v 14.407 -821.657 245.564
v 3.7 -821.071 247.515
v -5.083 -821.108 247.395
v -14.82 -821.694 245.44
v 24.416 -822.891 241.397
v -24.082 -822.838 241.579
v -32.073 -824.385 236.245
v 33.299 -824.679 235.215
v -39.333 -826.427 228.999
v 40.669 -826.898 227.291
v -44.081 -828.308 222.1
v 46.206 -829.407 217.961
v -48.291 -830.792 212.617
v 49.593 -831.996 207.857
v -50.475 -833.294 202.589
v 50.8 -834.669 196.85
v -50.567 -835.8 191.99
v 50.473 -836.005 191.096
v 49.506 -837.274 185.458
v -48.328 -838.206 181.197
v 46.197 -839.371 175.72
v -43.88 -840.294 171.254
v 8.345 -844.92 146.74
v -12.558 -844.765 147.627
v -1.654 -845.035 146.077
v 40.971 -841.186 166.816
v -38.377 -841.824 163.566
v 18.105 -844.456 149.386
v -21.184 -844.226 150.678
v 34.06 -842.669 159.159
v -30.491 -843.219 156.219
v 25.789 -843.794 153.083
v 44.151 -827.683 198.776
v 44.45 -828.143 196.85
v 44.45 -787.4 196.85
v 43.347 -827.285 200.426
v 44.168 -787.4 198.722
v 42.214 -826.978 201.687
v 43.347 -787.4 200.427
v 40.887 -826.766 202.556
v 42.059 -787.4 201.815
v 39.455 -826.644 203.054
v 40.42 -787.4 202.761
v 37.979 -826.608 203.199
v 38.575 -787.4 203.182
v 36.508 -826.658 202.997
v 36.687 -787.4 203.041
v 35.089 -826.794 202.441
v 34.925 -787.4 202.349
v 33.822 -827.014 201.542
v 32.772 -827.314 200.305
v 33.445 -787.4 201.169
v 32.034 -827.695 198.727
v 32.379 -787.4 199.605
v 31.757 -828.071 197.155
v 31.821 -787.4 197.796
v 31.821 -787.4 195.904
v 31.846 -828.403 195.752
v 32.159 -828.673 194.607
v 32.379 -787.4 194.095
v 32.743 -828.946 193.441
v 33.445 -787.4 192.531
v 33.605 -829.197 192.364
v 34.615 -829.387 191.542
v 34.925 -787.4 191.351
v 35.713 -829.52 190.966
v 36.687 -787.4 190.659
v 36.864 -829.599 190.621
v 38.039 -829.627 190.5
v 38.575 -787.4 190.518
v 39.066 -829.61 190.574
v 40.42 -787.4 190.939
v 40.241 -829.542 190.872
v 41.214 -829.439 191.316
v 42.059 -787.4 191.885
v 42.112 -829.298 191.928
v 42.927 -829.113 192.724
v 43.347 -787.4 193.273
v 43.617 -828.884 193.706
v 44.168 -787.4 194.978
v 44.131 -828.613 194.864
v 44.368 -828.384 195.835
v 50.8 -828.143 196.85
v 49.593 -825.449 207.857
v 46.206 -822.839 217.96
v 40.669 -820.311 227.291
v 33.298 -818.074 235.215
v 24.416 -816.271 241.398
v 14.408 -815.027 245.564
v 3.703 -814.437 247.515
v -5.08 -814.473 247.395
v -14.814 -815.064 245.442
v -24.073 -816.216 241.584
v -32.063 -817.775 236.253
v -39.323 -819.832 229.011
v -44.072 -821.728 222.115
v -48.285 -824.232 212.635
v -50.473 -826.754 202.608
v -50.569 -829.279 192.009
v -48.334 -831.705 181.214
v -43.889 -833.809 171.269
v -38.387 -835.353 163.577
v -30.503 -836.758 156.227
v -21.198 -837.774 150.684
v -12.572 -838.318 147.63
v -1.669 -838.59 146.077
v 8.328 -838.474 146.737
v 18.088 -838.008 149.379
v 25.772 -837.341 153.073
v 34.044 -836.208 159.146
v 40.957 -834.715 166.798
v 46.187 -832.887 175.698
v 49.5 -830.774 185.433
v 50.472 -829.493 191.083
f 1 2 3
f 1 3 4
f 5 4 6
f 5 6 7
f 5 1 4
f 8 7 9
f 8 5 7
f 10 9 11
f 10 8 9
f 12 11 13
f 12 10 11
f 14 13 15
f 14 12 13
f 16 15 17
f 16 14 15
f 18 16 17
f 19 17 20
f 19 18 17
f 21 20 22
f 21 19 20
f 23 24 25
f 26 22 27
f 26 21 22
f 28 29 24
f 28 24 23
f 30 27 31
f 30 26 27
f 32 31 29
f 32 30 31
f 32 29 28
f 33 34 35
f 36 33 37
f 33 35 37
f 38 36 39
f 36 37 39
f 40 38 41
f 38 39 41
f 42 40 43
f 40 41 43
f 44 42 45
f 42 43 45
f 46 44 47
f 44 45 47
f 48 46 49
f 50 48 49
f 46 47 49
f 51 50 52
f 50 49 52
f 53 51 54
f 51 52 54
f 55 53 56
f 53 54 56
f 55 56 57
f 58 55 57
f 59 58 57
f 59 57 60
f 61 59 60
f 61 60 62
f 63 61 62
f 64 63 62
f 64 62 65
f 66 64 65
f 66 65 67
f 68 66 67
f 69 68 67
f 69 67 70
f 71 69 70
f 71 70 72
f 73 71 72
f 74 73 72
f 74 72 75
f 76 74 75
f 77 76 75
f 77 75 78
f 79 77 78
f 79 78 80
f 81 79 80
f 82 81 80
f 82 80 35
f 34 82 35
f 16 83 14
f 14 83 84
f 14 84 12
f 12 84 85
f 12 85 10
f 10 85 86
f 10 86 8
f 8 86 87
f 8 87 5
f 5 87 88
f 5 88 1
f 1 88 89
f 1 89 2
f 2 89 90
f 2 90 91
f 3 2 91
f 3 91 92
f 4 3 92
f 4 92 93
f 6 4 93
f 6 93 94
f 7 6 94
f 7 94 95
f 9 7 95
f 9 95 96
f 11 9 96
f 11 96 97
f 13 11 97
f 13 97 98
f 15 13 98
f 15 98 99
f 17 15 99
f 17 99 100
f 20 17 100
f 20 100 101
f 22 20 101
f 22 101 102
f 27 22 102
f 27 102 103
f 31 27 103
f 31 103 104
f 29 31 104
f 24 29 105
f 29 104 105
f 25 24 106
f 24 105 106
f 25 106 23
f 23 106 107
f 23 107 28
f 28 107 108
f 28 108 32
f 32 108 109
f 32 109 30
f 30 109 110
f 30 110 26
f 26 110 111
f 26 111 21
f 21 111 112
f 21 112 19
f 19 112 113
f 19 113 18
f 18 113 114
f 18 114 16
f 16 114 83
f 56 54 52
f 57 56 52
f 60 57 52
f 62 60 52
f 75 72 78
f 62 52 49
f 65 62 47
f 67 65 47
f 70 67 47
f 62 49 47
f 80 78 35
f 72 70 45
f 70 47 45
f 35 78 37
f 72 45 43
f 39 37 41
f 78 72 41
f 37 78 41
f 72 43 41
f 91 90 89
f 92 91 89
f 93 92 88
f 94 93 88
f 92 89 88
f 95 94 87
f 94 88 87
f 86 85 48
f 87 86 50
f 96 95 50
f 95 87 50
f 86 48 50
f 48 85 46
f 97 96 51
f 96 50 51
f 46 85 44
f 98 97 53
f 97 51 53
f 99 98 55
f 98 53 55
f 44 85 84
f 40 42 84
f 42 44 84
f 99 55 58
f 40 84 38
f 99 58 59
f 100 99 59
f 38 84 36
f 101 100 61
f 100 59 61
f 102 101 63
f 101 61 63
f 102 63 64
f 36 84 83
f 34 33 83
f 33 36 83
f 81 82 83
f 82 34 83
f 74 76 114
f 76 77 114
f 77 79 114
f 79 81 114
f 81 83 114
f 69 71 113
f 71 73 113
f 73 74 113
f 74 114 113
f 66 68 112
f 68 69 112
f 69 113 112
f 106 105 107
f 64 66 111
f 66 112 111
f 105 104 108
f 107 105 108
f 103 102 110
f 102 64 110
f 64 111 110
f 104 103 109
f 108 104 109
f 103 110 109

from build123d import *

# Parameters (mm, degrees)
F1_DEPTH = 50.8
F2_R     = 851.2175
F3_DEPTH = 50.8
F4_W     = 254
F4_H     = 762
F4_R     = 50.8
F5_DEPTH = 857.5685
F7_R     = 6.35


with BuildPart() as f1:
    # F0 (on Right) → F1 (new body, symmetric)
    with BuildSketch(Plane.YZ):
        with BuildLine():
            Line((-794.0675, -323.85), (-794.0675, 323.85))
            ThreePointArc((-794.0675, 323.85), (-857.5675, 0), (-794.0675, -323.85))
        make_face()
    extrude(amount=F1_DEPTH, both=True)

    # F2 (on Right) → F3 (cut, symmetric)
    with BuildSketch(Plane.YZ):
        Circle(F2_R)
    extrude(amount=F3_DEPTH, both=True, mode=Mode.SUBTRACT)

    # F4 (on Front) → F5 (cut, through all)
    with BuildSketch(Plane.XZ):
        Rectangle(F4_W, F4_H)
        with Locations((0, 196.85)):
            Circle(F4_R, mode=Mode.SUBTRACT)
    extrude(amount=F5_DEPTH, mode=Mode.SUBTRACT)

    # F7 (on offset) → F8 (join, up to the next surface of F1)
    with BuildSketch(Plane.XZ.offset(787.4)):
        with Locations((38.1, 196.85)):
            Circle(F7_R)
    extrude(until=Until.NEXT)


solid = f1.part
